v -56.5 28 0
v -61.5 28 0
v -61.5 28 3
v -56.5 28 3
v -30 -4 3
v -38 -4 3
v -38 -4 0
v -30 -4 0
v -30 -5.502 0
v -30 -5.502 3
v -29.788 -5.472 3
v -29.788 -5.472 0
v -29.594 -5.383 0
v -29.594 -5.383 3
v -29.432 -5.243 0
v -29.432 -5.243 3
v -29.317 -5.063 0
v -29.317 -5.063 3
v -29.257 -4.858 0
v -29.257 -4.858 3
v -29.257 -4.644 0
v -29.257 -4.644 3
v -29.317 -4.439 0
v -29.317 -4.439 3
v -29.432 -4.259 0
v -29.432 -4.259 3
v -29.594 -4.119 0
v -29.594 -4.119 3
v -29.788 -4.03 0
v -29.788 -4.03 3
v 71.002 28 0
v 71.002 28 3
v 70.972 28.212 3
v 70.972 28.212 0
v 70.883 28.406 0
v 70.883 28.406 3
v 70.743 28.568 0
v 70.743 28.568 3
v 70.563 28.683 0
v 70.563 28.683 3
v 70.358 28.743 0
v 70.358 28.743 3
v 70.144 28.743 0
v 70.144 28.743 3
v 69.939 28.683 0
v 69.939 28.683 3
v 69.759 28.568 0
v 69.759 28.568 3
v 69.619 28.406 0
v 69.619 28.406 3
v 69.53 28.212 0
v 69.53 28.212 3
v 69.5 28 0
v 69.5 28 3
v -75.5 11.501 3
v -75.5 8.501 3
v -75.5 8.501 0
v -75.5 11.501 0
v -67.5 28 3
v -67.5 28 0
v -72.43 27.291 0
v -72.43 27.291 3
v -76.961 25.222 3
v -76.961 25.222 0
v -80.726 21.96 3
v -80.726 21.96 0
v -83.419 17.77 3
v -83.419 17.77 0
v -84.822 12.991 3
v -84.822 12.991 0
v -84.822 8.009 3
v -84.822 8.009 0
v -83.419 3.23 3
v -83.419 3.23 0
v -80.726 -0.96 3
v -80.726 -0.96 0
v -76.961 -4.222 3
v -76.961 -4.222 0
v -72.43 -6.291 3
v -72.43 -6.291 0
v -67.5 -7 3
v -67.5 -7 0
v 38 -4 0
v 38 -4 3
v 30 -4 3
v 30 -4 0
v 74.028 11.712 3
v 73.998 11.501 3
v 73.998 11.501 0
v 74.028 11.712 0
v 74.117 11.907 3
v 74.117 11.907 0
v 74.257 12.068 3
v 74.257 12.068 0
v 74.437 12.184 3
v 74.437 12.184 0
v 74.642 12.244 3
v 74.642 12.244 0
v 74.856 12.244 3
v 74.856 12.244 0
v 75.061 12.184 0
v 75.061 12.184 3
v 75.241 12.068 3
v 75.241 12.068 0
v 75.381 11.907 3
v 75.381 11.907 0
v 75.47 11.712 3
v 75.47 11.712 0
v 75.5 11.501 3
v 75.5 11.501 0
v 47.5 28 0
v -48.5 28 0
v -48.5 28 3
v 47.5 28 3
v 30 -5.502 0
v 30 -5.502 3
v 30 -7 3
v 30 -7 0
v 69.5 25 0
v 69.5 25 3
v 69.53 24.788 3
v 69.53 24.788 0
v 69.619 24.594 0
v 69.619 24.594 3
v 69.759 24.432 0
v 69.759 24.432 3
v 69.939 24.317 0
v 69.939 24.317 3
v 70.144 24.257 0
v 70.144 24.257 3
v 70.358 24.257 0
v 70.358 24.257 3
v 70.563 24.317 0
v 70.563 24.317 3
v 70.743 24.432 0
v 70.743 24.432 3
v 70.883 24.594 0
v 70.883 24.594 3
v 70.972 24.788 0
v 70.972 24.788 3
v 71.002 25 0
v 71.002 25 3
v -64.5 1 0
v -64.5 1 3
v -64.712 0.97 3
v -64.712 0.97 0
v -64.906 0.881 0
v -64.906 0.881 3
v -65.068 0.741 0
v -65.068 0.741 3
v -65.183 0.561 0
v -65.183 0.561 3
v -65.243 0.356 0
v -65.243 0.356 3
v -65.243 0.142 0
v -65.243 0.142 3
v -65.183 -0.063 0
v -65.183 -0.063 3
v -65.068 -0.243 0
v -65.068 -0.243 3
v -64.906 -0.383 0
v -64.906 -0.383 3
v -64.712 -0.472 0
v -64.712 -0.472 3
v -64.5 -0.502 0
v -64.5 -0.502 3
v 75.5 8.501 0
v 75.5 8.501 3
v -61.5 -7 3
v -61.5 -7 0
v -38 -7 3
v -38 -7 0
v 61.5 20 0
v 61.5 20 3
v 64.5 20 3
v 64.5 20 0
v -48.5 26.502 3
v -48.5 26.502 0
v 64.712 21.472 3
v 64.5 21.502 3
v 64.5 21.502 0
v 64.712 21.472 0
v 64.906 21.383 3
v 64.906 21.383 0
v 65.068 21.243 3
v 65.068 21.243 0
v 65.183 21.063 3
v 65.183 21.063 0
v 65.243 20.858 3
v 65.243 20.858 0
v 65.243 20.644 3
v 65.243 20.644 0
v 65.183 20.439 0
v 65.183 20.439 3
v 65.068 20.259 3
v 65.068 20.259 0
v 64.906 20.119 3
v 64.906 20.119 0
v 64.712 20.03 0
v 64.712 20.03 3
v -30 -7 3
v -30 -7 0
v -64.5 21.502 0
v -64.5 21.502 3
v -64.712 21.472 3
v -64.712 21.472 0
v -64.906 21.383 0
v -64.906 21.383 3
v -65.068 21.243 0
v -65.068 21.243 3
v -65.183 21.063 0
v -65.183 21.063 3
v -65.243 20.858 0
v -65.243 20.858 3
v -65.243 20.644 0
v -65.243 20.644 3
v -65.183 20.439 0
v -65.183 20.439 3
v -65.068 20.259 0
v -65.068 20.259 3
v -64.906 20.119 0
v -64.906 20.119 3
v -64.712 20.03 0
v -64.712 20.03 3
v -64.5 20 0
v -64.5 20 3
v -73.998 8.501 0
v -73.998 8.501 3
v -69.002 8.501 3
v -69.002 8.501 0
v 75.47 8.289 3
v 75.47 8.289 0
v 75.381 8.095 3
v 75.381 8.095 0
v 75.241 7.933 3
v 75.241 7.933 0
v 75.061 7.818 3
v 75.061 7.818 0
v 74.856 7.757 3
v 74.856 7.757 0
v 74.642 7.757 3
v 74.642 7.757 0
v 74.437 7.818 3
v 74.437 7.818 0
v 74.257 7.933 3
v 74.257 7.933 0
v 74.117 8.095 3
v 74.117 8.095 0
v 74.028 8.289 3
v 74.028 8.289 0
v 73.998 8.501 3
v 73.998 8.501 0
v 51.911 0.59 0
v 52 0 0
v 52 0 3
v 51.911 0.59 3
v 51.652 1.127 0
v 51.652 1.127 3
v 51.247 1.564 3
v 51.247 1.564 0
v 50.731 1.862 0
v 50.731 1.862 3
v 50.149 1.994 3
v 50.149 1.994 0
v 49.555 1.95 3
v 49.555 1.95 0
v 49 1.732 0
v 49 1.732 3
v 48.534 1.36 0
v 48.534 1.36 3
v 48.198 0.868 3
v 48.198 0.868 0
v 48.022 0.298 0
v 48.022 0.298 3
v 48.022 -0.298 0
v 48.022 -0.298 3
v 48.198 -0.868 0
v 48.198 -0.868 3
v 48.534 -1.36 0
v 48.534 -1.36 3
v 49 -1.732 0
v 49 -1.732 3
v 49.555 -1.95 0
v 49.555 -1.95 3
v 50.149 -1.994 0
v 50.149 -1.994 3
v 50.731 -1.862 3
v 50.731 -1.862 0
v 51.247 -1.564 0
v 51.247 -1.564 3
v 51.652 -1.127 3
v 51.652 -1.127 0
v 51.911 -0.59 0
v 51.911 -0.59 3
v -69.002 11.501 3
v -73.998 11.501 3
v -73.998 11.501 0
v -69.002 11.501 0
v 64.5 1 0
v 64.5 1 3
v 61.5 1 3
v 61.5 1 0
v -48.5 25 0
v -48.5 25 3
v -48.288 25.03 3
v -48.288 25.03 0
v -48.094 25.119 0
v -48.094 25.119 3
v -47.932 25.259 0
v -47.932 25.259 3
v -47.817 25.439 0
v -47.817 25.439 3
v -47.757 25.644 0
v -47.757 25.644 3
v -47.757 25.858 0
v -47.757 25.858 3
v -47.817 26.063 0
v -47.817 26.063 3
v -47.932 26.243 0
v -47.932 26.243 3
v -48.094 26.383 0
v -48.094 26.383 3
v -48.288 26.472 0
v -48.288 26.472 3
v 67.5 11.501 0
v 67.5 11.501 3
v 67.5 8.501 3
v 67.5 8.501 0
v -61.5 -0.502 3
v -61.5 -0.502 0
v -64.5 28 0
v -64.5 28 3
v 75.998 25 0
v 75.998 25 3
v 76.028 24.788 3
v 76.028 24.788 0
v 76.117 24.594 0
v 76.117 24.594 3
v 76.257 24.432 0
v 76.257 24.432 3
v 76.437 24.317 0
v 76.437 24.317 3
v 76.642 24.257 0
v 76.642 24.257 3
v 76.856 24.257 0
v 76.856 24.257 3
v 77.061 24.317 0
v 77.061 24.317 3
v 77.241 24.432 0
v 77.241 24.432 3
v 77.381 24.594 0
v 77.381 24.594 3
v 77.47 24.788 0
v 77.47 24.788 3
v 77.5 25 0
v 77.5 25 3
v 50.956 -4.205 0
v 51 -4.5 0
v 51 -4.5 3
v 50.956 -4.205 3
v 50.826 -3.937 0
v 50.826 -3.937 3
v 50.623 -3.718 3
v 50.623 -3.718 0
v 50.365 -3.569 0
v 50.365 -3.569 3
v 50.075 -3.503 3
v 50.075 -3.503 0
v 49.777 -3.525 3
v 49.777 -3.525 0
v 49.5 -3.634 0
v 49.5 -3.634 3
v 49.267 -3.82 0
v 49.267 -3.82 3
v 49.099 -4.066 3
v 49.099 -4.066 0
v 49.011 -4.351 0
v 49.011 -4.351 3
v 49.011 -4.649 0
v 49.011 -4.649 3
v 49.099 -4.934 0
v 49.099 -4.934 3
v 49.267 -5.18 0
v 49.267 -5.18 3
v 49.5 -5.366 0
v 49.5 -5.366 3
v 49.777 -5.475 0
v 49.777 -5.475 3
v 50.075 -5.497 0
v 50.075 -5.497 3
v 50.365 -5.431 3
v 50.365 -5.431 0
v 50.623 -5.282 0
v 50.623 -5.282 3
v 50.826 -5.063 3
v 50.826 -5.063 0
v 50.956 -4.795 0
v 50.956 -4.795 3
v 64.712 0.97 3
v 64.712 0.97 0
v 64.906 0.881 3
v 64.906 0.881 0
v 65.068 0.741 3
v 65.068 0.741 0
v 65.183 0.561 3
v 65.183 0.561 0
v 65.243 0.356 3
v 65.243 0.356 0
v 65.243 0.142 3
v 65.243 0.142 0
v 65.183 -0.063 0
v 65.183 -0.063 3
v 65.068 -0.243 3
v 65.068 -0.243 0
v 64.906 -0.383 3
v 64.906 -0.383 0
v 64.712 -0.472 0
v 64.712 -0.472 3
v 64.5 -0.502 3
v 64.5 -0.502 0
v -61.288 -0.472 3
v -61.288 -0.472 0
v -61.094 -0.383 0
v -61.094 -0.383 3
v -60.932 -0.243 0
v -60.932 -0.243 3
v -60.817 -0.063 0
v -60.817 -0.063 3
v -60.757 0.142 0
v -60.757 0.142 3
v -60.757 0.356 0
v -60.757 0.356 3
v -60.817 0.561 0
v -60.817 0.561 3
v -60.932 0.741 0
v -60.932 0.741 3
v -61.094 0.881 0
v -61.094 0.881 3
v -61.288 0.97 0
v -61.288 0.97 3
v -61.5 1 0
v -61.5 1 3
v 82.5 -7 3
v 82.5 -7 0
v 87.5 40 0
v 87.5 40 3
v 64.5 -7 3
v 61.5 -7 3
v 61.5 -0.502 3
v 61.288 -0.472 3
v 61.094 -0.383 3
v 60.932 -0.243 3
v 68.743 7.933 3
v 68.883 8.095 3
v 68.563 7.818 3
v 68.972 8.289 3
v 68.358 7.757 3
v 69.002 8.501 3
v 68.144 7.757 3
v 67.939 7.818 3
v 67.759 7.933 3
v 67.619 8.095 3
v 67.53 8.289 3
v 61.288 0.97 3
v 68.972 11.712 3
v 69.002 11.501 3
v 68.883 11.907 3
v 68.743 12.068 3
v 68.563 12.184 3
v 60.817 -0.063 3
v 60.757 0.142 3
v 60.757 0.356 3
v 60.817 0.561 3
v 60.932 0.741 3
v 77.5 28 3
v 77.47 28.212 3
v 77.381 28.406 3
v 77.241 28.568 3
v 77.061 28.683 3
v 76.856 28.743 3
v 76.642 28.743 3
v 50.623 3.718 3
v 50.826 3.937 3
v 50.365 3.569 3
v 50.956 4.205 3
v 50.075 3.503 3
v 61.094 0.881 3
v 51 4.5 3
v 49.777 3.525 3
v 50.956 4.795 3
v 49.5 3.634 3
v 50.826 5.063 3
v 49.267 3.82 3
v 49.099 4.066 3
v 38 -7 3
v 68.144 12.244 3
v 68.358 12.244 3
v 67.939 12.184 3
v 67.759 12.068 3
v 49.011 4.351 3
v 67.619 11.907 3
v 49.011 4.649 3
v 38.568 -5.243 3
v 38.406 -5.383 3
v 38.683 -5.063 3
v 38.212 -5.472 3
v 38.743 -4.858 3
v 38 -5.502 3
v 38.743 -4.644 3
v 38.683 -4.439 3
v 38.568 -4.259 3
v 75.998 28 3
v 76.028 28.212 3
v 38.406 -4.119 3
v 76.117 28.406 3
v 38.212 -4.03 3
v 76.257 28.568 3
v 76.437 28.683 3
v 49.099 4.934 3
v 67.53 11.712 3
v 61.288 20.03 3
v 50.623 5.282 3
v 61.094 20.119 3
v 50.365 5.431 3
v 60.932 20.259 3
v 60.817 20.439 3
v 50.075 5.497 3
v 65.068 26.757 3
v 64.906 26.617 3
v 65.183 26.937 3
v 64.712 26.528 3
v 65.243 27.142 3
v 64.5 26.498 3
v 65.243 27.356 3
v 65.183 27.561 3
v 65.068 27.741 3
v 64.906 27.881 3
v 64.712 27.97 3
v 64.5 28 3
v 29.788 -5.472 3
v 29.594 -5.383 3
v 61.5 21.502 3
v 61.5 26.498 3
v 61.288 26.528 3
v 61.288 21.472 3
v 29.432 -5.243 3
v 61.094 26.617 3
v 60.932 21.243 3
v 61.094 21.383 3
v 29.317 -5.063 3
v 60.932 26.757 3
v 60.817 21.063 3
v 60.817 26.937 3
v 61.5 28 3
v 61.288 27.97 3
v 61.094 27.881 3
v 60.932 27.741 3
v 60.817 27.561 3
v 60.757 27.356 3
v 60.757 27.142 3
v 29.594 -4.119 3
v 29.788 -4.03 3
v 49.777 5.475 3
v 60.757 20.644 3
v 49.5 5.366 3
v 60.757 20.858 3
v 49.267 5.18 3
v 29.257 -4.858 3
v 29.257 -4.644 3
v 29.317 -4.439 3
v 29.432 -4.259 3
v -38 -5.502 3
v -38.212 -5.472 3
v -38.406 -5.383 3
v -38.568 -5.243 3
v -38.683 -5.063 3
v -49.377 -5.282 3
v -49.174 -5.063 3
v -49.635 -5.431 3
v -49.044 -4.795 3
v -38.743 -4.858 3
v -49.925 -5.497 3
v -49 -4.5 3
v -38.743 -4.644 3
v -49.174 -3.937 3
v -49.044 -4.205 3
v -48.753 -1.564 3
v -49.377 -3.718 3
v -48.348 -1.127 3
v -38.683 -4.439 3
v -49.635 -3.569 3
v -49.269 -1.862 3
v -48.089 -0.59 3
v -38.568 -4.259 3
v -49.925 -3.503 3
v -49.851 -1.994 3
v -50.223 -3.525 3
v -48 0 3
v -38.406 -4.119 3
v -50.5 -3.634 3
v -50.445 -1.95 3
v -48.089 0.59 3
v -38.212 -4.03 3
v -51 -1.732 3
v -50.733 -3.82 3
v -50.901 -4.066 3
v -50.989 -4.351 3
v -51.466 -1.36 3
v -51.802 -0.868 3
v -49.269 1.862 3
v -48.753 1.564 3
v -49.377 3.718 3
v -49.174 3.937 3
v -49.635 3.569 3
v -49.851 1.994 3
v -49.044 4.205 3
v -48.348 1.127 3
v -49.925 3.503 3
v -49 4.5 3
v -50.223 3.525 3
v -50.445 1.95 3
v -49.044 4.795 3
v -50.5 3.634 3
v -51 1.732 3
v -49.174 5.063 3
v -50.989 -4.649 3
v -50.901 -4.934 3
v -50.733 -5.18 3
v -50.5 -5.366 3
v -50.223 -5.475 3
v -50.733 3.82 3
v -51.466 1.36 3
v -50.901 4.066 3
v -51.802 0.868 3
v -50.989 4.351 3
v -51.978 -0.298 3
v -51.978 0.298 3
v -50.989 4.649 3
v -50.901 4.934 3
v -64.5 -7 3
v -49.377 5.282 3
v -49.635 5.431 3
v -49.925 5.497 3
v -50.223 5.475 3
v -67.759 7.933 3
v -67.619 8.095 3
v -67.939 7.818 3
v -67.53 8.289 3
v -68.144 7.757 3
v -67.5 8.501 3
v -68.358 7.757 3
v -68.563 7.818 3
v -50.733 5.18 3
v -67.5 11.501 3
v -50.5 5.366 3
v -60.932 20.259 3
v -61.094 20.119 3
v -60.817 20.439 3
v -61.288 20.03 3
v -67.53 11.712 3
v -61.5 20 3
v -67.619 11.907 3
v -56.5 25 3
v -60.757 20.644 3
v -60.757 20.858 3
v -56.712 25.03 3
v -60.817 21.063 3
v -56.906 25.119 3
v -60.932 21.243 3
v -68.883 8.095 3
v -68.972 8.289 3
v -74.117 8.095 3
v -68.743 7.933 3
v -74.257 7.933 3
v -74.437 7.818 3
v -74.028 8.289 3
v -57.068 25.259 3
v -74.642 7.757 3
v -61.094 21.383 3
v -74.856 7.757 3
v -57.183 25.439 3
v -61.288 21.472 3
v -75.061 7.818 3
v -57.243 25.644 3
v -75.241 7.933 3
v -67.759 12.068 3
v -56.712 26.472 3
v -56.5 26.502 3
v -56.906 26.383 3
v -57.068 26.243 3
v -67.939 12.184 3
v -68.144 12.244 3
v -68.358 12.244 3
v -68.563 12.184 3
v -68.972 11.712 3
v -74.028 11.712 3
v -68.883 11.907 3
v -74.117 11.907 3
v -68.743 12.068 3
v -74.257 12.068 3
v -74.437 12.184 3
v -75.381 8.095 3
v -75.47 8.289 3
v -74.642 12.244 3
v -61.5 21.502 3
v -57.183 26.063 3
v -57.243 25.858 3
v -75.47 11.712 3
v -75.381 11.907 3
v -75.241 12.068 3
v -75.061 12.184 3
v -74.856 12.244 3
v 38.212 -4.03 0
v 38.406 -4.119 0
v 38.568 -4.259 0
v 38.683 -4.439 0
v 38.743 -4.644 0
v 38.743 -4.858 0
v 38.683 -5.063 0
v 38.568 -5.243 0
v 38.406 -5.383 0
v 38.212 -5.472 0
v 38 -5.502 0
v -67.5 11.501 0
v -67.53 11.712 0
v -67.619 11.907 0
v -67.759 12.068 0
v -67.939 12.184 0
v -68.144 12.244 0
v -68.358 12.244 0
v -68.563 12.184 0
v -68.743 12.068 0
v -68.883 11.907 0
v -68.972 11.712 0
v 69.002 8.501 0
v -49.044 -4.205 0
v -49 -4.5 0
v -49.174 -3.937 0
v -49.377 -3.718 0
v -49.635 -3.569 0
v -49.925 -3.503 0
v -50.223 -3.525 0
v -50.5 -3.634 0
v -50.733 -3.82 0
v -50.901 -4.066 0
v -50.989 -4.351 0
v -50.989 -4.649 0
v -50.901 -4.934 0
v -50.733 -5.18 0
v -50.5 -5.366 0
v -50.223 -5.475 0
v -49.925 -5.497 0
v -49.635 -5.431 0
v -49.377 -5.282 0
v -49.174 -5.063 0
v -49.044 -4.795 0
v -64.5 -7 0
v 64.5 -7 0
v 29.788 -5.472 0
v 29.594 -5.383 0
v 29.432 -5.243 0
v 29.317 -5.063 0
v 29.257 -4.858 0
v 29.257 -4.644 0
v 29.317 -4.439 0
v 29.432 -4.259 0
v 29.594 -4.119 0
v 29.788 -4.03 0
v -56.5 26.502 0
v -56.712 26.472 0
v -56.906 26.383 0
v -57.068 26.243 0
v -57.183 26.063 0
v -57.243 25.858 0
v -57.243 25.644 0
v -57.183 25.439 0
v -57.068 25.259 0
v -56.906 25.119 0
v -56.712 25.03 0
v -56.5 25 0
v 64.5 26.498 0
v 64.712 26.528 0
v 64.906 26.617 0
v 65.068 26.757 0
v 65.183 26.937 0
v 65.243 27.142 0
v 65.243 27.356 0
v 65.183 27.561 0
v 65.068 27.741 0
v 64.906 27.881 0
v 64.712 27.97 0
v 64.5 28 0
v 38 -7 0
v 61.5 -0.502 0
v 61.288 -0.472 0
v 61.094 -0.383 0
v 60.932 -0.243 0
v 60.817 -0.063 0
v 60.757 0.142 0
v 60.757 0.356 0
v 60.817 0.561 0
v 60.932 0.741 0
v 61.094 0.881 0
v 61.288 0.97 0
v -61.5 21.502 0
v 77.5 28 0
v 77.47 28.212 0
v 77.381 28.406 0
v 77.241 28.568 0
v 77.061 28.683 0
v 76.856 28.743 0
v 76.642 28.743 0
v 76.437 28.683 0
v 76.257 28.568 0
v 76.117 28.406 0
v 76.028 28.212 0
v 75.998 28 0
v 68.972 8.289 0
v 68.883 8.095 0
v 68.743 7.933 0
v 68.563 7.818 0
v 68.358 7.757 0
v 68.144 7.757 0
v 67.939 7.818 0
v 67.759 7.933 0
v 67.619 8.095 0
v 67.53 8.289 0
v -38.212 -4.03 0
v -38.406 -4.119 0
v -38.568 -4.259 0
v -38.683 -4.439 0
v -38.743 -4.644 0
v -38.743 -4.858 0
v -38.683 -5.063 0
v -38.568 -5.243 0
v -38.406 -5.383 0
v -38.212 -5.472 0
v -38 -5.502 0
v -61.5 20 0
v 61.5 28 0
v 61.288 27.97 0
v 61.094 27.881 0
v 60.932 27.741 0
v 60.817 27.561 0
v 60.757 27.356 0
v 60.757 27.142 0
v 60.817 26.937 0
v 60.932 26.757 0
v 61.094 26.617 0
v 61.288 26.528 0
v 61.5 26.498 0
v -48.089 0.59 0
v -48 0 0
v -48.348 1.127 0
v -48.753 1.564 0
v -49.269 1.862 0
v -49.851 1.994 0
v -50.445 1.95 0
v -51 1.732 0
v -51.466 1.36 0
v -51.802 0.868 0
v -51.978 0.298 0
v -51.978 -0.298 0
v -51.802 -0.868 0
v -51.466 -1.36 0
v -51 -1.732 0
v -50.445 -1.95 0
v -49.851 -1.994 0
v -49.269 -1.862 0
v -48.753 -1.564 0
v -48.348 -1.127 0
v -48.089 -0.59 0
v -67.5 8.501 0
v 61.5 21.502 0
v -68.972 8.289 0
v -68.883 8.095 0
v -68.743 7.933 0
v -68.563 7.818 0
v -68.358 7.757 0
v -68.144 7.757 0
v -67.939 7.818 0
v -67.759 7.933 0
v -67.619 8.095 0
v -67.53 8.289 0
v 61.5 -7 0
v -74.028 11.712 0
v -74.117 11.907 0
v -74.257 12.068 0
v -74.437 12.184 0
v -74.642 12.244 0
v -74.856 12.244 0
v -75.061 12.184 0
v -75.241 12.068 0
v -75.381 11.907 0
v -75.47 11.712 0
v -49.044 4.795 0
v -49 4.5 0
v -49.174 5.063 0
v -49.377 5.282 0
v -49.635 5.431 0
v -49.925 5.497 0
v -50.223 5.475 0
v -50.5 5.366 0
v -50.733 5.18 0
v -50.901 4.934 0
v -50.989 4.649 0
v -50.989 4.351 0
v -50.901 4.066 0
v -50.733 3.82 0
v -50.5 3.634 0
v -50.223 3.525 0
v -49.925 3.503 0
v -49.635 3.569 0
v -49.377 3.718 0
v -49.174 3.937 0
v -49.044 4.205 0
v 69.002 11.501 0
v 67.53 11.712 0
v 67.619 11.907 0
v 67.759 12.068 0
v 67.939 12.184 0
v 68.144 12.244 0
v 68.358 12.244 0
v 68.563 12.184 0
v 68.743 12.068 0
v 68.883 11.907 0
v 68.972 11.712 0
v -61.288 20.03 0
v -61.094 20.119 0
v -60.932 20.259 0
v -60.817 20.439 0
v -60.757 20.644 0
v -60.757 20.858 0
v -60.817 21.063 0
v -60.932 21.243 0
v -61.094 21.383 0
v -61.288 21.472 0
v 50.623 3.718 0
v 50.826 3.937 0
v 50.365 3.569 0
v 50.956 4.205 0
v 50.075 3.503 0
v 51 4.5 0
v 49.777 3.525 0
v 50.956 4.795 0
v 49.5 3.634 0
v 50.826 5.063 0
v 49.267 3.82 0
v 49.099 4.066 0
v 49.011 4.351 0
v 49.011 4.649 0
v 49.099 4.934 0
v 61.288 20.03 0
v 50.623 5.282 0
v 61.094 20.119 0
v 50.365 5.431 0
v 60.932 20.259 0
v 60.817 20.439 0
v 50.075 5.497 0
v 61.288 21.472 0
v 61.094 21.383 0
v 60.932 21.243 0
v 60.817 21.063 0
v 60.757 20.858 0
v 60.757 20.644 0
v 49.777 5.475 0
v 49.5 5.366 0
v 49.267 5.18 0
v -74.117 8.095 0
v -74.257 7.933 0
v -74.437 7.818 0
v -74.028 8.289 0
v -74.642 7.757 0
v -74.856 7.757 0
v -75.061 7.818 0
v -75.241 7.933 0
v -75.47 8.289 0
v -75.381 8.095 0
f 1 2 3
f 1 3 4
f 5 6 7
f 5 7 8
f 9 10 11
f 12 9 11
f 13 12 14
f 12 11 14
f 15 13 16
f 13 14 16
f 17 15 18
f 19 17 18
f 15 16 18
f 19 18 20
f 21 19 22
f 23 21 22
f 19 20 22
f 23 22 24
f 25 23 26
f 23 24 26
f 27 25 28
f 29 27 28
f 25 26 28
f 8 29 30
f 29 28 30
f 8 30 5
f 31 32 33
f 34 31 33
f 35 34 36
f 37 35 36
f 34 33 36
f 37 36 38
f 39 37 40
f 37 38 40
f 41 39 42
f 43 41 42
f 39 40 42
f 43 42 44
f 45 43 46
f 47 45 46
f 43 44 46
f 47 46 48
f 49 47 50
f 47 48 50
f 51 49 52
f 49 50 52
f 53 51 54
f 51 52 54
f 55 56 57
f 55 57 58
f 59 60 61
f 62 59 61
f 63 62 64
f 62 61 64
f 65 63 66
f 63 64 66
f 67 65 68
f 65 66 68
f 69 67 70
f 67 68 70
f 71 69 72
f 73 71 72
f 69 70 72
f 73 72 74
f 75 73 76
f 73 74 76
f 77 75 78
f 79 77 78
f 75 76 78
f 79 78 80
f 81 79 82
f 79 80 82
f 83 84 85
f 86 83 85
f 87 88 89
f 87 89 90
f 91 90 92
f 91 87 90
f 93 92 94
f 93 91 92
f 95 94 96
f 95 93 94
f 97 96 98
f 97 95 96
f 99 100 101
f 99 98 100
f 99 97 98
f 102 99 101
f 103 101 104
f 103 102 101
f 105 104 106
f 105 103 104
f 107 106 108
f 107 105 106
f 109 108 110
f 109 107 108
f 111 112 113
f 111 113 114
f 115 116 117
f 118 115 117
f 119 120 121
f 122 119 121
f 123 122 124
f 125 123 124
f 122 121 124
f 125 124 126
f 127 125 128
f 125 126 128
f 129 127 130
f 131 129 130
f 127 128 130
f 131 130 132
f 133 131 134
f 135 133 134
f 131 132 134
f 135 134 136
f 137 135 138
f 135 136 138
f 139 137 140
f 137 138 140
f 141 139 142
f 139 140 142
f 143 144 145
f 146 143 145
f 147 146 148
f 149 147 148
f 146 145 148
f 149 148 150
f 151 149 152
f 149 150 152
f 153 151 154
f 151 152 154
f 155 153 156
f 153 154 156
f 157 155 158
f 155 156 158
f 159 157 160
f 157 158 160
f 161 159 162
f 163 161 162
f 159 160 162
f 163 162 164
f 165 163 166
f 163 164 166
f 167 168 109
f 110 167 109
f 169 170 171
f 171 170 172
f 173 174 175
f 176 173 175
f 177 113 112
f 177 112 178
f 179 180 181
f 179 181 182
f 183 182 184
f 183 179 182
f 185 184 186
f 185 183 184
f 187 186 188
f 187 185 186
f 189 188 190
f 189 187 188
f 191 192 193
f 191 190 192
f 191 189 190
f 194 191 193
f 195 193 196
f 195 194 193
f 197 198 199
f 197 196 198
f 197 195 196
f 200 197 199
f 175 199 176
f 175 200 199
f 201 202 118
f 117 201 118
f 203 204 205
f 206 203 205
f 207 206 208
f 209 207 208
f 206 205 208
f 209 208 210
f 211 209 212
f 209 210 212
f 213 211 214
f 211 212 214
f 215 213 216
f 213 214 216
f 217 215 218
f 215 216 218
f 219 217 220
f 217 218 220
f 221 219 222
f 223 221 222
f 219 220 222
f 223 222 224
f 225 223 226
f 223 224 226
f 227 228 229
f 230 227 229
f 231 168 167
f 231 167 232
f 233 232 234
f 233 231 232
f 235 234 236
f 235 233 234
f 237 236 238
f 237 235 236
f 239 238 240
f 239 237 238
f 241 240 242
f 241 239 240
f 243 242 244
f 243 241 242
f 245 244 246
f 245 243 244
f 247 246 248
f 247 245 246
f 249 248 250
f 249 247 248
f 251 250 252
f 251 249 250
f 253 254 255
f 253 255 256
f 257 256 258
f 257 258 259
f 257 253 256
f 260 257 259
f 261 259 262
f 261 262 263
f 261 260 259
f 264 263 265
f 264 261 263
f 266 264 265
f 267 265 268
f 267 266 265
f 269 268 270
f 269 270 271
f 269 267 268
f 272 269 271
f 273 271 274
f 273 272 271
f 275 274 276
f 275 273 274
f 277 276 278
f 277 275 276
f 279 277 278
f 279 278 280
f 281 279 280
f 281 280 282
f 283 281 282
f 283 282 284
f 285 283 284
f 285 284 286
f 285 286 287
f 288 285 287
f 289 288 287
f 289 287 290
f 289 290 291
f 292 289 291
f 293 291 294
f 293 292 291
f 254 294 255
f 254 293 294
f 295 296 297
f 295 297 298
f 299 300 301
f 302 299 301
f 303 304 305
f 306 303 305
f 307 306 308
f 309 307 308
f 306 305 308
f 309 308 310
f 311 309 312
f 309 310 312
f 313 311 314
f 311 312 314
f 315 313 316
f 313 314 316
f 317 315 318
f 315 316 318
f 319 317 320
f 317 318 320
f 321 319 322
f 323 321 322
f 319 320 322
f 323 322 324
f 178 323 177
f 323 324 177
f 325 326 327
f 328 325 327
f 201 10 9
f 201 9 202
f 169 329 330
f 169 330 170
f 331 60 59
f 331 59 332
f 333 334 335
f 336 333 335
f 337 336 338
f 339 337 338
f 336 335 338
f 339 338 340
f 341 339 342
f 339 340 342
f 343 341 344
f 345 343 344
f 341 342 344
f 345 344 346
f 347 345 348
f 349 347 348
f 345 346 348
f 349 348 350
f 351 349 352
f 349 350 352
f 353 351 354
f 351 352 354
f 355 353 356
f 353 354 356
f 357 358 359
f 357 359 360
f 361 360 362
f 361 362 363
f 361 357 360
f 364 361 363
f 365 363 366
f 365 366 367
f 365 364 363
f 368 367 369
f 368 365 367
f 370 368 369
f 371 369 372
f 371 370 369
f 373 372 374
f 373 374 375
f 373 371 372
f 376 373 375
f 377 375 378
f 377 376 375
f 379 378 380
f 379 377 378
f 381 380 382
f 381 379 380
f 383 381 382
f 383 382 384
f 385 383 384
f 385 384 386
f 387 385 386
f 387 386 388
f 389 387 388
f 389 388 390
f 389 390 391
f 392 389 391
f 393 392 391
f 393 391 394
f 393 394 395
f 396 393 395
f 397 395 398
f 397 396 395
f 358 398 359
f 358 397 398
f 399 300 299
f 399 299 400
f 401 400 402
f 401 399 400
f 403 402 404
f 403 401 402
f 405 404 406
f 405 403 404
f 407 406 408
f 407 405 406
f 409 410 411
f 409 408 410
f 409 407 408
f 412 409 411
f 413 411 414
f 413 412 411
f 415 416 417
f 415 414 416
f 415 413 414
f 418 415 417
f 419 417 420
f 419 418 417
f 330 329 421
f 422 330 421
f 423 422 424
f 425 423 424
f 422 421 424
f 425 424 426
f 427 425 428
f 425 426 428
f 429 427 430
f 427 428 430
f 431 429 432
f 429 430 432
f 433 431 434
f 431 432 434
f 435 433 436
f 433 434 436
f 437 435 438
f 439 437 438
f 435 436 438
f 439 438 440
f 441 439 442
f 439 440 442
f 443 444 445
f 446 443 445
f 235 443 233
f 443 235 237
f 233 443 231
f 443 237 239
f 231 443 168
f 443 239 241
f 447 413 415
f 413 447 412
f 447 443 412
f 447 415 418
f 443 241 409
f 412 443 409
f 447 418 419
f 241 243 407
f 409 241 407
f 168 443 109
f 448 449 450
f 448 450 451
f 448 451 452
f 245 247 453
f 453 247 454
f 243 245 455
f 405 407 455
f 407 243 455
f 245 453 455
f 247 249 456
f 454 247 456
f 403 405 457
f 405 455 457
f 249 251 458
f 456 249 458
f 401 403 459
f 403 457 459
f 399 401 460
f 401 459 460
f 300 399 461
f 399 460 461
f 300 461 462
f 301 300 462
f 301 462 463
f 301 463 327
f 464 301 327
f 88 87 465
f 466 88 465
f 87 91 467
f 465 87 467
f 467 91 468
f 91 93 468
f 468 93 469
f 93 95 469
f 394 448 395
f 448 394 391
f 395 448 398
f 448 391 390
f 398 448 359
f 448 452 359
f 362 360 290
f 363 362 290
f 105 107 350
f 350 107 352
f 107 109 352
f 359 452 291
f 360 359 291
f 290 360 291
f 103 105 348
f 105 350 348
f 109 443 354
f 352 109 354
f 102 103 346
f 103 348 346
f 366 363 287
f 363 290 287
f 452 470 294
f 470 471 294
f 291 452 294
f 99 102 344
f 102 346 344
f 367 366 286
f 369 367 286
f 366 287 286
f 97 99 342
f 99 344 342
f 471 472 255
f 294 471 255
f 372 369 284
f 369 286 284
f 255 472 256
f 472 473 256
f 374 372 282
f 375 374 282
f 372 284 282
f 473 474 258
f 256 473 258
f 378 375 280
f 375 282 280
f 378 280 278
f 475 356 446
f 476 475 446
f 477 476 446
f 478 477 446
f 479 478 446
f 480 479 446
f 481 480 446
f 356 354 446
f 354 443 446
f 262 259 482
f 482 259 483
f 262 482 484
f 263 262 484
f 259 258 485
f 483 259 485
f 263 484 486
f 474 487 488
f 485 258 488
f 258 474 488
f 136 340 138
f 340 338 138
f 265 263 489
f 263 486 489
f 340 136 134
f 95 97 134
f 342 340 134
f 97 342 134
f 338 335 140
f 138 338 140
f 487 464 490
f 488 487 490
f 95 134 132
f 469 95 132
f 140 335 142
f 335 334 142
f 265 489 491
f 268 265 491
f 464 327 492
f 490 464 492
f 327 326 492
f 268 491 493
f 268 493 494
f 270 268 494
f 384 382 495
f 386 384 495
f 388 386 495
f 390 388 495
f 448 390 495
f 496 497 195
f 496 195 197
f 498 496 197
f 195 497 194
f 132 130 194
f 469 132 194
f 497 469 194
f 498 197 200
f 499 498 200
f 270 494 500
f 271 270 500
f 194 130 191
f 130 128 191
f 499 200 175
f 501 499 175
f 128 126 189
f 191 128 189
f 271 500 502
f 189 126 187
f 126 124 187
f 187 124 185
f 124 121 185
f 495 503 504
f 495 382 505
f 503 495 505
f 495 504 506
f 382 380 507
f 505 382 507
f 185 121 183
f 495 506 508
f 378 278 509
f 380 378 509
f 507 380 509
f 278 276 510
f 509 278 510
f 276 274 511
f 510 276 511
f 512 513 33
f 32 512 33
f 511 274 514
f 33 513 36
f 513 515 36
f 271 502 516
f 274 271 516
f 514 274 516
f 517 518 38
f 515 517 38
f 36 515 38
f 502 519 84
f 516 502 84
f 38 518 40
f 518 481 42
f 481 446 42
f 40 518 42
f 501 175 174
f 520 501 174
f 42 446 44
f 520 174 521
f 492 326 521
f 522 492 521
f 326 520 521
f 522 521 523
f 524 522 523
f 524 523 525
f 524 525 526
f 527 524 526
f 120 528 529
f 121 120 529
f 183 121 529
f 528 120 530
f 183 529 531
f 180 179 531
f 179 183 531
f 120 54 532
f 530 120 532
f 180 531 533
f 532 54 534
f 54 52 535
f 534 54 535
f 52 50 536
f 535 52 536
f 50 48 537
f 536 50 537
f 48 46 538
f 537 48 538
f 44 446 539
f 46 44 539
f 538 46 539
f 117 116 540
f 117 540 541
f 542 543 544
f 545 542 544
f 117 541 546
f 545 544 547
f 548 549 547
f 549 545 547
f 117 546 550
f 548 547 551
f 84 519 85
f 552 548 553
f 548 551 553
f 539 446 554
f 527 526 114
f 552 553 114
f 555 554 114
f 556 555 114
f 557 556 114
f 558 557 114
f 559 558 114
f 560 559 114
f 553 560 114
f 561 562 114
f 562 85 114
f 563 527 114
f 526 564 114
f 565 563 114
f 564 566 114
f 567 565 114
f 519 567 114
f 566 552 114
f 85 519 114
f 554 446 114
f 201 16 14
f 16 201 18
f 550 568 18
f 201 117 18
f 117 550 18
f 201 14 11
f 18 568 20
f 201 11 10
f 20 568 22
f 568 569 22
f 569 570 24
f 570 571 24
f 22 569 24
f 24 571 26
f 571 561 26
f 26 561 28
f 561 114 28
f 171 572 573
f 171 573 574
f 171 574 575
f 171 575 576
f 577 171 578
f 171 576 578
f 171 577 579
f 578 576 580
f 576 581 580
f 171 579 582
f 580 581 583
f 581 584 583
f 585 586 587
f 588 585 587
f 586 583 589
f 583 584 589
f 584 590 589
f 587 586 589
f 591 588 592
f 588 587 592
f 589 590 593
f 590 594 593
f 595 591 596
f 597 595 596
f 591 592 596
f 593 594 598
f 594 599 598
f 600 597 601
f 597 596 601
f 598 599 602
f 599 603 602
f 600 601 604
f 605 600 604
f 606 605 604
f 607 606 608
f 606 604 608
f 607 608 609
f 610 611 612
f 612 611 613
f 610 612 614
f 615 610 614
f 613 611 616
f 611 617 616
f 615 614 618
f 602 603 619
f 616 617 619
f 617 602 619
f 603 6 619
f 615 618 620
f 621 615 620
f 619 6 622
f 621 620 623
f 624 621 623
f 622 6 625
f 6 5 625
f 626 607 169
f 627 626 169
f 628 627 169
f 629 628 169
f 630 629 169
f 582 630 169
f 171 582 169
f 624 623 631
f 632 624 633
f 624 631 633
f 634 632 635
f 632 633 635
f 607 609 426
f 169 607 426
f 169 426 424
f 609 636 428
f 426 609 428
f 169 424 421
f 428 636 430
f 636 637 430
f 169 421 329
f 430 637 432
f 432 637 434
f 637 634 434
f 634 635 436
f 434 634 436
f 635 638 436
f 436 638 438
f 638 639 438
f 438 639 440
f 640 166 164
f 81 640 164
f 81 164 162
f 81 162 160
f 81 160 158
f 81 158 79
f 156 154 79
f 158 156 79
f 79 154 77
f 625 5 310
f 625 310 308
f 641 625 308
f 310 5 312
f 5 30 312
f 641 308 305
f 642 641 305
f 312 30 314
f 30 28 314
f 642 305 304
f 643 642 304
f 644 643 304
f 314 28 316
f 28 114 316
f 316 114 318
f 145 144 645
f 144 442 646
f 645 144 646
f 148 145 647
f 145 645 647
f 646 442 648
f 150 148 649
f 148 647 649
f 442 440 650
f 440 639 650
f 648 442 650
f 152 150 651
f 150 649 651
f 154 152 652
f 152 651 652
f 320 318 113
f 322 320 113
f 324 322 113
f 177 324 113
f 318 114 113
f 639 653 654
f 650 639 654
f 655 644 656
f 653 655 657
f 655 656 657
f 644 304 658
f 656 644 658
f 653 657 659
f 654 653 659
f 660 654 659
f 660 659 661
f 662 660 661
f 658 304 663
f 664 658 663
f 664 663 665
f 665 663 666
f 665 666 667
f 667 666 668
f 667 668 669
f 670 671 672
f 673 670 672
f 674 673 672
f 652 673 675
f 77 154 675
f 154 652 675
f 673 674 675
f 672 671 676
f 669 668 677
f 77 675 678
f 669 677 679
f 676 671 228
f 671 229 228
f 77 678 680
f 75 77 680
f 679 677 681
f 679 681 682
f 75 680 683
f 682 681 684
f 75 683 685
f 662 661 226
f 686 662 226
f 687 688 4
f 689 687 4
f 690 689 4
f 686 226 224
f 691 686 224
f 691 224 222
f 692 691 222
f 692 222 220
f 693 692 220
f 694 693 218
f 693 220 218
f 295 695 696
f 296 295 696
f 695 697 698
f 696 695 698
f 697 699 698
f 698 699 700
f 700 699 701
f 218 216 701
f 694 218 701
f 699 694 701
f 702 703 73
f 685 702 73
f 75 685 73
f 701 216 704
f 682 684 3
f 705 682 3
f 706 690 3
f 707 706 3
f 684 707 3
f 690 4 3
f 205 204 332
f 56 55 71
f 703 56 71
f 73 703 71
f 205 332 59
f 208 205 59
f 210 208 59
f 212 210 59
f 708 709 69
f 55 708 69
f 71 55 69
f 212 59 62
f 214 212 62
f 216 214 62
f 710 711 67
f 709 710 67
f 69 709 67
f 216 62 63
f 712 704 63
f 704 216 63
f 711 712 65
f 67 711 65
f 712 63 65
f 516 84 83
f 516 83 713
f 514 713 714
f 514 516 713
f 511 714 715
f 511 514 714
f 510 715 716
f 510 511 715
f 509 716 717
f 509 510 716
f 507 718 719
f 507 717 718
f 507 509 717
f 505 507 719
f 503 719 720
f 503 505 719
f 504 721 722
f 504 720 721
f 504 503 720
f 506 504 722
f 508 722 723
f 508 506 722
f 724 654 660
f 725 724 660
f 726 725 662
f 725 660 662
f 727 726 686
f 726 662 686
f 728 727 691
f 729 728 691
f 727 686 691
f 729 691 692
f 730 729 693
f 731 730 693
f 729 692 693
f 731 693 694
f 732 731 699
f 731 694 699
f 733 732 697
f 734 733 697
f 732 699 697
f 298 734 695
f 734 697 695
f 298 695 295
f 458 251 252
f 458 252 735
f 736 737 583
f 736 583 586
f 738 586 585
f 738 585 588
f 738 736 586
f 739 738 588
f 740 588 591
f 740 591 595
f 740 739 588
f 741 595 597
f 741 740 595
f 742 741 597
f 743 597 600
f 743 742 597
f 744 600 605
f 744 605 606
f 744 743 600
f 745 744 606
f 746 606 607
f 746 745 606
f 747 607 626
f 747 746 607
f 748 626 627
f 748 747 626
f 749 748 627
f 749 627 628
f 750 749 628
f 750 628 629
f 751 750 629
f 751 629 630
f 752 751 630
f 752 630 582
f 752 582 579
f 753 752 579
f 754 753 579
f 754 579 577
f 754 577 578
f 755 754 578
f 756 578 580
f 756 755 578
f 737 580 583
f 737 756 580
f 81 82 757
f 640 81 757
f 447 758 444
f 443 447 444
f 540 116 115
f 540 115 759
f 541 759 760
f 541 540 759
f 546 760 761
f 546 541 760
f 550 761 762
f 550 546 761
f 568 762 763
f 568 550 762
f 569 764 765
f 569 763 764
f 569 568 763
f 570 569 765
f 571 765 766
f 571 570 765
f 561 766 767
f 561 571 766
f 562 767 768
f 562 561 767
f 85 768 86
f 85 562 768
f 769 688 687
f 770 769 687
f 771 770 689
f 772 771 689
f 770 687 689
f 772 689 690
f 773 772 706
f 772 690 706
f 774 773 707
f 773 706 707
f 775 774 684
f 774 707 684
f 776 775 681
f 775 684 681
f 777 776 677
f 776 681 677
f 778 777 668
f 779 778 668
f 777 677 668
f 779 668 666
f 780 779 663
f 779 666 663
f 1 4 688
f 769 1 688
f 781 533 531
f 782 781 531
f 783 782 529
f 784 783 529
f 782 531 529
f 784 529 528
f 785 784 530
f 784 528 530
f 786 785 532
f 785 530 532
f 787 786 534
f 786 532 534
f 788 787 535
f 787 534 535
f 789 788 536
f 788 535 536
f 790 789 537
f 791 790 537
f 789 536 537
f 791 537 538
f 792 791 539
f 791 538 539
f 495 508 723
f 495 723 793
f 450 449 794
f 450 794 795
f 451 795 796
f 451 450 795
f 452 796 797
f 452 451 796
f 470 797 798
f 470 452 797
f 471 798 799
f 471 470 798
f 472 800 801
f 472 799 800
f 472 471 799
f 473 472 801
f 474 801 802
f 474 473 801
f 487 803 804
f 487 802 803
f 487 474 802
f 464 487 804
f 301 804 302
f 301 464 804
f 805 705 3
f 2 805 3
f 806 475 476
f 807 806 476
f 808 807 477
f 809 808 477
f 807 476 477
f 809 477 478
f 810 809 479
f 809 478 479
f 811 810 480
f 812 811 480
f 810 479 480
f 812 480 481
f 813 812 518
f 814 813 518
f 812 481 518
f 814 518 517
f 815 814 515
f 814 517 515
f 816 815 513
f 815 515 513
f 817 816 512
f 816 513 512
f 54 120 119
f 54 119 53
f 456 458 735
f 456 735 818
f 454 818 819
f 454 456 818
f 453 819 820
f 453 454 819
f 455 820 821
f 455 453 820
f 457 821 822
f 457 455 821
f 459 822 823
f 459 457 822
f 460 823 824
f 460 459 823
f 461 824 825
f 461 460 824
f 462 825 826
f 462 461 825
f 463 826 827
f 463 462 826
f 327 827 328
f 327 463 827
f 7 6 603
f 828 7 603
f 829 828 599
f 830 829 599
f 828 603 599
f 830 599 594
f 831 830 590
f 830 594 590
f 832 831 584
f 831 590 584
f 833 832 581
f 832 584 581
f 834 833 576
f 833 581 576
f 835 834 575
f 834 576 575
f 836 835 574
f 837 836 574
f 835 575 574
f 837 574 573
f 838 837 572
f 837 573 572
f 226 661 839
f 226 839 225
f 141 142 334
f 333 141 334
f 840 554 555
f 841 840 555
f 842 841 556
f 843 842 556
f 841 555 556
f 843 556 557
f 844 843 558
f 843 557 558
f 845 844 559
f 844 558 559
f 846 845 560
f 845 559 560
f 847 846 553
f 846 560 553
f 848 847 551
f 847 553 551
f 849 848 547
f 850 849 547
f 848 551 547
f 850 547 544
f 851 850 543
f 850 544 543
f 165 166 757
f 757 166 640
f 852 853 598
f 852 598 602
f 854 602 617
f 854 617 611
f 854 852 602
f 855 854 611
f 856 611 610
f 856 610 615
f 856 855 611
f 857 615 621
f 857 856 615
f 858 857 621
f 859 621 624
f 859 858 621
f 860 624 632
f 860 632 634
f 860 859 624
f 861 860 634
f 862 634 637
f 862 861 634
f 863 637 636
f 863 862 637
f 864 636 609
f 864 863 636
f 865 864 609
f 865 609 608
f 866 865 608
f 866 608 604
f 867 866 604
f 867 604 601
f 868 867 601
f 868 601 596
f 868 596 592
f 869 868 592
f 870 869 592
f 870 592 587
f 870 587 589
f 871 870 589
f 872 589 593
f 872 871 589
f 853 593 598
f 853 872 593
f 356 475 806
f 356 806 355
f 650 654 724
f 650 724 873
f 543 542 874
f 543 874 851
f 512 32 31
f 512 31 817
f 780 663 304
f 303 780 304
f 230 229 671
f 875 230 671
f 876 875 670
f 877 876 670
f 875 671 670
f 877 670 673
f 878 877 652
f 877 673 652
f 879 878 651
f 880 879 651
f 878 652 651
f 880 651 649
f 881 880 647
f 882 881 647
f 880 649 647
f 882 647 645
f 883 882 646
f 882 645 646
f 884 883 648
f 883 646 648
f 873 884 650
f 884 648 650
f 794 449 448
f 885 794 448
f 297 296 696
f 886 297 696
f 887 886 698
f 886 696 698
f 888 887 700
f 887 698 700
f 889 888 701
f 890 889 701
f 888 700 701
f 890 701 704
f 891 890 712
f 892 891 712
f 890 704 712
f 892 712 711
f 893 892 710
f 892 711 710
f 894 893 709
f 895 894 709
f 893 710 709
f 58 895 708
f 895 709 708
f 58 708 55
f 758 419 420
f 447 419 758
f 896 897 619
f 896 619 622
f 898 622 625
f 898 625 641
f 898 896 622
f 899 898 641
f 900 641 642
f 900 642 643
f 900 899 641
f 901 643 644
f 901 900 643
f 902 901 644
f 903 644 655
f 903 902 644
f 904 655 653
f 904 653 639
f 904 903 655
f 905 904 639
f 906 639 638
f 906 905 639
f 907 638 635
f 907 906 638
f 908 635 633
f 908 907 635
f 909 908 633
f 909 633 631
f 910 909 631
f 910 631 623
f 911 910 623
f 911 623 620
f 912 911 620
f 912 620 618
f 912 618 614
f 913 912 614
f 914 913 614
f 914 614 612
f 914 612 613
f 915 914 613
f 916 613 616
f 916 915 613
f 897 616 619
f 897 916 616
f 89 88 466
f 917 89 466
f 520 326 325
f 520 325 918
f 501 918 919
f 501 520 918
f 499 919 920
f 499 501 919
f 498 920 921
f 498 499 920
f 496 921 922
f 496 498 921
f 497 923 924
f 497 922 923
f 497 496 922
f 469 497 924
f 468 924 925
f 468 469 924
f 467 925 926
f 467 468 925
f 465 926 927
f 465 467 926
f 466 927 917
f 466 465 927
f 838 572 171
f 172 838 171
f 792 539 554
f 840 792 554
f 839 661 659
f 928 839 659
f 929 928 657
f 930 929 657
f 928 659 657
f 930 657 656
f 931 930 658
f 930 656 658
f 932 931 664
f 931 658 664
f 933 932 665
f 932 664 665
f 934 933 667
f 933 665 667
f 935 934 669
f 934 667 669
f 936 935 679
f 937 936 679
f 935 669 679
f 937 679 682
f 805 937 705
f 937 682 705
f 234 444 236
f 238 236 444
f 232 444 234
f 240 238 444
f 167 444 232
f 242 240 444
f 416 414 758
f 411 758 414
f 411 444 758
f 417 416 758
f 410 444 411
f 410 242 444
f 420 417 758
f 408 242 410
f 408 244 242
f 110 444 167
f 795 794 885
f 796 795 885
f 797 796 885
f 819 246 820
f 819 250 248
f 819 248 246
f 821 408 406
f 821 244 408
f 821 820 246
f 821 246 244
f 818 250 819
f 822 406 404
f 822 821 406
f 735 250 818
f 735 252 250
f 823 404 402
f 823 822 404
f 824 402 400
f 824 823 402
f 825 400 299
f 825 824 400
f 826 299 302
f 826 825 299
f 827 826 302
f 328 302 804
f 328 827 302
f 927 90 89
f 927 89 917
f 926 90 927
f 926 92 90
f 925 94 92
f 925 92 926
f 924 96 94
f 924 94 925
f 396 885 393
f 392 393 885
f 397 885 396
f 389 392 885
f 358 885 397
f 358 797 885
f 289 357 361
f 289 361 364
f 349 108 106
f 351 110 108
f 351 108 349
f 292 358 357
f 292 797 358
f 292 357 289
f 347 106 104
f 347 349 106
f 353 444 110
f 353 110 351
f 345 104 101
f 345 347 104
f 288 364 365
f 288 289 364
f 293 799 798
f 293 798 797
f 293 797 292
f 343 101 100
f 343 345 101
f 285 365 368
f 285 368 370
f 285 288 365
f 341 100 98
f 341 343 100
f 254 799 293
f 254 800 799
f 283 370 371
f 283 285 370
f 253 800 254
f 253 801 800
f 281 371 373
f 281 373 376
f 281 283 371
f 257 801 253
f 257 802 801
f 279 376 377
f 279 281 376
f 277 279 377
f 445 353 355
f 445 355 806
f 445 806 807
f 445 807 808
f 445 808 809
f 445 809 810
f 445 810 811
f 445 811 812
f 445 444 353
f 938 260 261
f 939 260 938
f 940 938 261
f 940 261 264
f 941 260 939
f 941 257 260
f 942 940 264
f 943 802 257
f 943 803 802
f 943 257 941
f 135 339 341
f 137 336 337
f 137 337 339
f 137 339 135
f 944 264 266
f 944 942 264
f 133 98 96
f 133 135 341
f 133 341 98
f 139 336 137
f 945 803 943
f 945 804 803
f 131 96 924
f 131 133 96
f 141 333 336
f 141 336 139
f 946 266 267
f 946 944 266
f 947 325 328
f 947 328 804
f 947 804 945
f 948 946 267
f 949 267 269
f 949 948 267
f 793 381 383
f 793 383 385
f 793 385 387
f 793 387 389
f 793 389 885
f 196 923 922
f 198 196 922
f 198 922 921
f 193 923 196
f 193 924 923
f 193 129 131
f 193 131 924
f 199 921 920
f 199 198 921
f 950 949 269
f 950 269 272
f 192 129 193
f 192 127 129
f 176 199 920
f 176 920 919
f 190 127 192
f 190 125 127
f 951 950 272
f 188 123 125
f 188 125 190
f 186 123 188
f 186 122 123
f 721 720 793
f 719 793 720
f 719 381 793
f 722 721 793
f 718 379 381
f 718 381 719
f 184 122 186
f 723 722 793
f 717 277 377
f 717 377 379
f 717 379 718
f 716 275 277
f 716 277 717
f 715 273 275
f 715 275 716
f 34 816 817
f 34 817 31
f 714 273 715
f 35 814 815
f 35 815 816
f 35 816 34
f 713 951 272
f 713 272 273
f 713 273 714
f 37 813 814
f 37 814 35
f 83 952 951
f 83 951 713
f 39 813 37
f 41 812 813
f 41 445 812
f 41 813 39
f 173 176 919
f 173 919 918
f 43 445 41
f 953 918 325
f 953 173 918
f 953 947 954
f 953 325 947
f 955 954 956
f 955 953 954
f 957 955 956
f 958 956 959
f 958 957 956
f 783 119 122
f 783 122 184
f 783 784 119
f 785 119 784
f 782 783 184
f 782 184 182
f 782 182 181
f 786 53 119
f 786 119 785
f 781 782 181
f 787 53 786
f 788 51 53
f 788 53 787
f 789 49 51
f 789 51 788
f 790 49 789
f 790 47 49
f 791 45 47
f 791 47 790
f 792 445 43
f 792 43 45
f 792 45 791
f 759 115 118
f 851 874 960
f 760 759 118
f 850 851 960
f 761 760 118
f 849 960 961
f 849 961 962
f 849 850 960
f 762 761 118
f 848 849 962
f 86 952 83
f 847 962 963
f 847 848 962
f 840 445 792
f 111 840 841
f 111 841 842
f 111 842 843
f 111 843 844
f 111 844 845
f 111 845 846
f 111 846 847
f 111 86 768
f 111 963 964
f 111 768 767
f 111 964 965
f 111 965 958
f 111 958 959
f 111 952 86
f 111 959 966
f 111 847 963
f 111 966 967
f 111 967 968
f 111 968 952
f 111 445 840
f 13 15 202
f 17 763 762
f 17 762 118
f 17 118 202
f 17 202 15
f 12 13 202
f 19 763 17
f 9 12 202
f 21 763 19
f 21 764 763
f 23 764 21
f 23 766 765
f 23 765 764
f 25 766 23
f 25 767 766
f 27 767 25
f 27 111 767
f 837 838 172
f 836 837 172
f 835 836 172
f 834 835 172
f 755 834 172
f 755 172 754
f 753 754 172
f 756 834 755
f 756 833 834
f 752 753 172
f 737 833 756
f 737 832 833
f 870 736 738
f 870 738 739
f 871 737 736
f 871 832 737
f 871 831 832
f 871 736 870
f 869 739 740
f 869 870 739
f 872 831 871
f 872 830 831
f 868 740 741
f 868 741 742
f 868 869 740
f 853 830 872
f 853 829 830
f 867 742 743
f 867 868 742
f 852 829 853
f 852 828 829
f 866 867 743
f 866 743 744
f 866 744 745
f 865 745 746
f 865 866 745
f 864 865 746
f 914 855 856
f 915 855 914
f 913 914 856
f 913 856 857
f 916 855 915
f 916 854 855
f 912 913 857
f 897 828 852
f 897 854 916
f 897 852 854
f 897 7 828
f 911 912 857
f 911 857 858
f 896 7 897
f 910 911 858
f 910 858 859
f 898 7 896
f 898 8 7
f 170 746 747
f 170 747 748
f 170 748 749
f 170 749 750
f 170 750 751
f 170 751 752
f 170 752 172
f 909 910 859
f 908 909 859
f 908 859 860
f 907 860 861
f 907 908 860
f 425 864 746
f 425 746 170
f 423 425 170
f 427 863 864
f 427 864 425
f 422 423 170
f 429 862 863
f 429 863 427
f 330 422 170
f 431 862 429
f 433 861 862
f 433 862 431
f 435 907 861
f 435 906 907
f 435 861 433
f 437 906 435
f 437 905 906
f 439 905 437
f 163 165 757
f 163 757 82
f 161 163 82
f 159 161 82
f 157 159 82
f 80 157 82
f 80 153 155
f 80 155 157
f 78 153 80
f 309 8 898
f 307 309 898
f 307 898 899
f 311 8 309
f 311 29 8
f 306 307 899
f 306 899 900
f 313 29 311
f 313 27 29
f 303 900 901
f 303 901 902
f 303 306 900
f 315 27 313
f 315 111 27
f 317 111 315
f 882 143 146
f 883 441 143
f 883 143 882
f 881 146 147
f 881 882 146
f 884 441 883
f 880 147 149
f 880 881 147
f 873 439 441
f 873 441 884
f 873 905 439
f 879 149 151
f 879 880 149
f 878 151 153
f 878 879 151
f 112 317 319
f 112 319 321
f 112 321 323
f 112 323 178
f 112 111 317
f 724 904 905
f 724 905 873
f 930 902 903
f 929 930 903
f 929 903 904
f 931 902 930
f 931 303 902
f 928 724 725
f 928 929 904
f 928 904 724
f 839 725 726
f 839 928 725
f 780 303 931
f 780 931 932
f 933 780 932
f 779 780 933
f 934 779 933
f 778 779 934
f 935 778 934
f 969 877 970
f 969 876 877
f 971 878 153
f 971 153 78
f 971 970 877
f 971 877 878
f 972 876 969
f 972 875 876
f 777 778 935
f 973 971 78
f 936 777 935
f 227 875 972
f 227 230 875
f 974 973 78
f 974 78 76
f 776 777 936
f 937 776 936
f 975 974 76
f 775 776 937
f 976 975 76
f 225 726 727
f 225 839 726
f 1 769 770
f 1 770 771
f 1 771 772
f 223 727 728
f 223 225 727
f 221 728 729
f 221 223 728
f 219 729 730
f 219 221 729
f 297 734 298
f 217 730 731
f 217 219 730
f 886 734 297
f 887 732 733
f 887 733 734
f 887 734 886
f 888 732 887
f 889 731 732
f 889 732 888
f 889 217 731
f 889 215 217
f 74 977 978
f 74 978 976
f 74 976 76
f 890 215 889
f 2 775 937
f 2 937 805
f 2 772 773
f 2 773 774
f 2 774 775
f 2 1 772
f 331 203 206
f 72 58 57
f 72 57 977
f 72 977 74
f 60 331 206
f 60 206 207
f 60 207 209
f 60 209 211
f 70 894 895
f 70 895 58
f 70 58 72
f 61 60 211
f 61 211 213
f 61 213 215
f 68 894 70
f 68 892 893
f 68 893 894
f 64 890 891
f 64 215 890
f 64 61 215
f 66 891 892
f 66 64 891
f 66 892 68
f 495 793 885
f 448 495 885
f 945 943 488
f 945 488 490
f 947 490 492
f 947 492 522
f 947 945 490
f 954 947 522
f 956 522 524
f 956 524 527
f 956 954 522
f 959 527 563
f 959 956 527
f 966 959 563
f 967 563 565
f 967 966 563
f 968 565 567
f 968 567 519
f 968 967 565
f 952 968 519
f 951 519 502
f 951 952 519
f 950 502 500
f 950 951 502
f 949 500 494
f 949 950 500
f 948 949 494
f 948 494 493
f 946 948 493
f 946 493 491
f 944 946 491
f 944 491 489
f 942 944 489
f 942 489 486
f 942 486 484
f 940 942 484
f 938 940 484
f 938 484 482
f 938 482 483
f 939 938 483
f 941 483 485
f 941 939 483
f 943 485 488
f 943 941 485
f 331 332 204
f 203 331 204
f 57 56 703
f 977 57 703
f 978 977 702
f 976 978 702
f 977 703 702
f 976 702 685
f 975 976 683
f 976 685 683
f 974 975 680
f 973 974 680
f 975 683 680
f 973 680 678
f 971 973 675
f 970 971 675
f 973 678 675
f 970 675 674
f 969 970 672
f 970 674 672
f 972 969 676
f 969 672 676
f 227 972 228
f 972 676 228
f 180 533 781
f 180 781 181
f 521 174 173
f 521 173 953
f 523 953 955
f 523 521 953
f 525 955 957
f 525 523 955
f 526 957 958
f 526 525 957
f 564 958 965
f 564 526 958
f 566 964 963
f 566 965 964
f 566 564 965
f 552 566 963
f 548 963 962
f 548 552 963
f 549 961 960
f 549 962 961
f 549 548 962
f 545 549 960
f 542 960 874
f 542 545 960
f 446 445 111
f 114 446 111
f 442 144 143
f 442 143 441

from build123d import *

# Parameters (mm, degrees)
SKETCH_R        = 1
SKETCH_R_2      = 2
PAD_DEPTH       = 3
POCKET_DEPTH    = 360.627901
POCKET001_DEPTH = 3.001
POCKET002_DEPTH = 360.627901
POCKET005_DEPTH = 3.001


with BuildPart() as part:
    # Sketch → Pad (new body)
    with BuildSketch(Plane.XY):
        with BuildLine():
            Line((-67.5, 28), (47.5, 28))
            Line((87.5, 40), (47.5, 28))
            Line((82.5, -7), (87.5, 40))
            Line((67.5, -7), (82.5, -7))
            Line((67.5, -7), (-67.5, -7))
            ThreePointArc((-67.5, 28), (-85, 10.5), (-67.5, -7))
        make_face()
        with Locations((-50, 4.5)):
            Circle(SKETCH_R, mode=Mode.SUBTRACT)
        with Locations((-50, -4.5)):
            Circle(SKETCH_R, mode=Mode.SUBTRACT)
        with Locations((-50, 0)):
            Circle(SKETCH_R_2, mode=Mode.SUBTRACT)
        with Locations((50, 0)):
            Circle(SKETCH_R_2, mode=Mode.SUBTRACT)
        with Locations((50, 4.5)):
            Circle(SKETCH_R, mode=Mode.SUBTRACT)
        with Locations((50, -4.5)):
            Circle(SKETCH_R, mode=Mode.SUBTRACT)
    extrude(amount=PAD_DEPTH)

    # Sketch001 → Pocket (cut, through all)
    with BuildSketch(Plane.XY.offset(3)):
        with BuildLine():
            Line((-67.5, 11.50065), (-67.5, 8.50065))
            ThreePointArc((-69.002, 8.50065), (-68.251, 7.74965), (-67.5, 8.50065))
            Line((-73.998, 8.50065), (-69.002, 8.50065))
            ThreePointArc((-75.5, 8.50065), (-74.749, 7.74965), (-73.998, 8.50065))
            Line((-75.5, 8.50065), (-75.5, 11.50065))
            ThreePointArc((-73.998, 11.50065), (-74.749, 12.25165), (-75.5, 11.50065))
            Line((-73.998, 11.50065), (-69.002, 11.50065))
            ThreePointArc((-67.5, 11.50065), (-68.251, 12.25165), (-69.002, 11.50065))
        make_face()
        with BuildLine():
            Line((-64.5, 1), (-61.5, 1))
            ThreePointArc((-61.5, -0.502), (-60.749, 0.249), (-61.5, 1))
            Line((-61.5, -0.502), (-61.5, -7))
            Line((-61.5, -7), (-64.5, -7))
            Line((-64.5, -0.502), (-64.5, -7))
            ThreePointArc((-64.5, 1), (-65.251, 0.249), (-64.5, -0.502))
        make_face()
        with BuildLine():
            Line((-64.5, 28), (-61.5, 28))
            Line((-61.5, 21.502), (-61.5, 28))
            ThreePointArc((-61.5, 20), (-60.749, 20.751), (-61.5, 21.502))
            Line((-61.5, 20), (-64.5, 20))
            ThreePointArc((-64.5, 21.502), (-65.251, 20.751), (-64.5, 20))
            Line((-64.5, 28), (-64.5, 21.502))
        make_face()
    pocket = extrude(amount=-POCKET_DEPTH, mode=Mode.SUBTRACT)

    # Mirrored: Pocket across Sketch001 V_Axis
    add(pocket.mirror(Plane(origin=(0, 0, 3), x_dir=(0, 0, 1), z_dir=(1, 0, 0))), mode=Mode.SUBTRACT)

    # Sketch002 → Pocket001 (cut, through all)
    with BuildSketch(Plane.XY.offset(3)):
        with BuildLine():
            ThreePointArc((61.5, 28), (60.749, 27.249), (61.5, 26.498))
            Line((61.5, 26.498), (64.5, 26.498))
            ThreePointArc((64.5, 26.498), (65.251, 27.249), (64.5, 28))
            Line((61.5, 28), (64.5, 28))
        make_face()
    extrude(amount=-POCKET001_DEPTH, mode=Mode.SUBTRACT)

    # Sketch003 → Pocket002 (cut, through all)
    with BuildSketch(Plane.XY.offset(3)):
        with BuildLine():
            Line((-38, -4), (-30, -4))
            ThreePointArc((-30, -5.502), (-29.249, -4.751), (-30, -4))
            Line((-30, -5.502), (-30, -7))
            Line((-30, -7), (-38, -7))
            Line((-38, -5.502), (-38, -7))
            ThreePointArc((-38, -4), (-38.751, -4.751), (-38, -5.502))
        make_face()
    pocket002 = extrude(amount=-POCKET002_DEPTH, mode=Mode.SUBTRACT)

    # Mirrored001: Pocket002 across Sketch003 V_Axis
    add(pocket002.mirror(Plane(origin=(0, 0, 3), x_dir=(0, 0, 1), z_dir=(1, 0, 0))), mode=Mode.SUBTRACT)

    # Sketch008 → Pocket005 (cut, through all)
    with BuildSketch(Plane.XY.offset(3)):
        with BuildLine():
            Line((-48.5, 28), (-56.5, 28))
            Line((-56.5, 28), (-56.5, 26.502))
            ThreePointArc((-56.5, 26.502), (-57.251, 25.751), (-56.5, 25))
            Line((-56.5, 25), (-48.5, 25))
            ThreePointArc((-48.5, 25), (-47.749, 25.751), (-48.5, 26.502))
            Line((-48.5, 28), (-48.5, 26.502))
        make_face()
        with BuildLine():
            Line((77.5, 28), (77.5, 25))
            ThreePointArc((75.998, 25), (76.749, 24.249), (77.5, 25))
            Line((71.002, 25), (75.998, 25))
            ThreePointArc((69.5, 25), (70.251, 24.249), (71.002, 25))
            Line((69.5, 25), (69.5, 28))
            ThreePointArc((71.002, 28), (70.251, 28.751), (69.5, 28))
            Line((71.002, 28), (75.998, 28))
            ThreePointArc((77.5, 28), (76.749, 28.751), (75.998, 28))
        make_face()
    extrude(amount=-POCKET005_DEPTH, mode=Mode.SUBTRACT)


solid = part.part
